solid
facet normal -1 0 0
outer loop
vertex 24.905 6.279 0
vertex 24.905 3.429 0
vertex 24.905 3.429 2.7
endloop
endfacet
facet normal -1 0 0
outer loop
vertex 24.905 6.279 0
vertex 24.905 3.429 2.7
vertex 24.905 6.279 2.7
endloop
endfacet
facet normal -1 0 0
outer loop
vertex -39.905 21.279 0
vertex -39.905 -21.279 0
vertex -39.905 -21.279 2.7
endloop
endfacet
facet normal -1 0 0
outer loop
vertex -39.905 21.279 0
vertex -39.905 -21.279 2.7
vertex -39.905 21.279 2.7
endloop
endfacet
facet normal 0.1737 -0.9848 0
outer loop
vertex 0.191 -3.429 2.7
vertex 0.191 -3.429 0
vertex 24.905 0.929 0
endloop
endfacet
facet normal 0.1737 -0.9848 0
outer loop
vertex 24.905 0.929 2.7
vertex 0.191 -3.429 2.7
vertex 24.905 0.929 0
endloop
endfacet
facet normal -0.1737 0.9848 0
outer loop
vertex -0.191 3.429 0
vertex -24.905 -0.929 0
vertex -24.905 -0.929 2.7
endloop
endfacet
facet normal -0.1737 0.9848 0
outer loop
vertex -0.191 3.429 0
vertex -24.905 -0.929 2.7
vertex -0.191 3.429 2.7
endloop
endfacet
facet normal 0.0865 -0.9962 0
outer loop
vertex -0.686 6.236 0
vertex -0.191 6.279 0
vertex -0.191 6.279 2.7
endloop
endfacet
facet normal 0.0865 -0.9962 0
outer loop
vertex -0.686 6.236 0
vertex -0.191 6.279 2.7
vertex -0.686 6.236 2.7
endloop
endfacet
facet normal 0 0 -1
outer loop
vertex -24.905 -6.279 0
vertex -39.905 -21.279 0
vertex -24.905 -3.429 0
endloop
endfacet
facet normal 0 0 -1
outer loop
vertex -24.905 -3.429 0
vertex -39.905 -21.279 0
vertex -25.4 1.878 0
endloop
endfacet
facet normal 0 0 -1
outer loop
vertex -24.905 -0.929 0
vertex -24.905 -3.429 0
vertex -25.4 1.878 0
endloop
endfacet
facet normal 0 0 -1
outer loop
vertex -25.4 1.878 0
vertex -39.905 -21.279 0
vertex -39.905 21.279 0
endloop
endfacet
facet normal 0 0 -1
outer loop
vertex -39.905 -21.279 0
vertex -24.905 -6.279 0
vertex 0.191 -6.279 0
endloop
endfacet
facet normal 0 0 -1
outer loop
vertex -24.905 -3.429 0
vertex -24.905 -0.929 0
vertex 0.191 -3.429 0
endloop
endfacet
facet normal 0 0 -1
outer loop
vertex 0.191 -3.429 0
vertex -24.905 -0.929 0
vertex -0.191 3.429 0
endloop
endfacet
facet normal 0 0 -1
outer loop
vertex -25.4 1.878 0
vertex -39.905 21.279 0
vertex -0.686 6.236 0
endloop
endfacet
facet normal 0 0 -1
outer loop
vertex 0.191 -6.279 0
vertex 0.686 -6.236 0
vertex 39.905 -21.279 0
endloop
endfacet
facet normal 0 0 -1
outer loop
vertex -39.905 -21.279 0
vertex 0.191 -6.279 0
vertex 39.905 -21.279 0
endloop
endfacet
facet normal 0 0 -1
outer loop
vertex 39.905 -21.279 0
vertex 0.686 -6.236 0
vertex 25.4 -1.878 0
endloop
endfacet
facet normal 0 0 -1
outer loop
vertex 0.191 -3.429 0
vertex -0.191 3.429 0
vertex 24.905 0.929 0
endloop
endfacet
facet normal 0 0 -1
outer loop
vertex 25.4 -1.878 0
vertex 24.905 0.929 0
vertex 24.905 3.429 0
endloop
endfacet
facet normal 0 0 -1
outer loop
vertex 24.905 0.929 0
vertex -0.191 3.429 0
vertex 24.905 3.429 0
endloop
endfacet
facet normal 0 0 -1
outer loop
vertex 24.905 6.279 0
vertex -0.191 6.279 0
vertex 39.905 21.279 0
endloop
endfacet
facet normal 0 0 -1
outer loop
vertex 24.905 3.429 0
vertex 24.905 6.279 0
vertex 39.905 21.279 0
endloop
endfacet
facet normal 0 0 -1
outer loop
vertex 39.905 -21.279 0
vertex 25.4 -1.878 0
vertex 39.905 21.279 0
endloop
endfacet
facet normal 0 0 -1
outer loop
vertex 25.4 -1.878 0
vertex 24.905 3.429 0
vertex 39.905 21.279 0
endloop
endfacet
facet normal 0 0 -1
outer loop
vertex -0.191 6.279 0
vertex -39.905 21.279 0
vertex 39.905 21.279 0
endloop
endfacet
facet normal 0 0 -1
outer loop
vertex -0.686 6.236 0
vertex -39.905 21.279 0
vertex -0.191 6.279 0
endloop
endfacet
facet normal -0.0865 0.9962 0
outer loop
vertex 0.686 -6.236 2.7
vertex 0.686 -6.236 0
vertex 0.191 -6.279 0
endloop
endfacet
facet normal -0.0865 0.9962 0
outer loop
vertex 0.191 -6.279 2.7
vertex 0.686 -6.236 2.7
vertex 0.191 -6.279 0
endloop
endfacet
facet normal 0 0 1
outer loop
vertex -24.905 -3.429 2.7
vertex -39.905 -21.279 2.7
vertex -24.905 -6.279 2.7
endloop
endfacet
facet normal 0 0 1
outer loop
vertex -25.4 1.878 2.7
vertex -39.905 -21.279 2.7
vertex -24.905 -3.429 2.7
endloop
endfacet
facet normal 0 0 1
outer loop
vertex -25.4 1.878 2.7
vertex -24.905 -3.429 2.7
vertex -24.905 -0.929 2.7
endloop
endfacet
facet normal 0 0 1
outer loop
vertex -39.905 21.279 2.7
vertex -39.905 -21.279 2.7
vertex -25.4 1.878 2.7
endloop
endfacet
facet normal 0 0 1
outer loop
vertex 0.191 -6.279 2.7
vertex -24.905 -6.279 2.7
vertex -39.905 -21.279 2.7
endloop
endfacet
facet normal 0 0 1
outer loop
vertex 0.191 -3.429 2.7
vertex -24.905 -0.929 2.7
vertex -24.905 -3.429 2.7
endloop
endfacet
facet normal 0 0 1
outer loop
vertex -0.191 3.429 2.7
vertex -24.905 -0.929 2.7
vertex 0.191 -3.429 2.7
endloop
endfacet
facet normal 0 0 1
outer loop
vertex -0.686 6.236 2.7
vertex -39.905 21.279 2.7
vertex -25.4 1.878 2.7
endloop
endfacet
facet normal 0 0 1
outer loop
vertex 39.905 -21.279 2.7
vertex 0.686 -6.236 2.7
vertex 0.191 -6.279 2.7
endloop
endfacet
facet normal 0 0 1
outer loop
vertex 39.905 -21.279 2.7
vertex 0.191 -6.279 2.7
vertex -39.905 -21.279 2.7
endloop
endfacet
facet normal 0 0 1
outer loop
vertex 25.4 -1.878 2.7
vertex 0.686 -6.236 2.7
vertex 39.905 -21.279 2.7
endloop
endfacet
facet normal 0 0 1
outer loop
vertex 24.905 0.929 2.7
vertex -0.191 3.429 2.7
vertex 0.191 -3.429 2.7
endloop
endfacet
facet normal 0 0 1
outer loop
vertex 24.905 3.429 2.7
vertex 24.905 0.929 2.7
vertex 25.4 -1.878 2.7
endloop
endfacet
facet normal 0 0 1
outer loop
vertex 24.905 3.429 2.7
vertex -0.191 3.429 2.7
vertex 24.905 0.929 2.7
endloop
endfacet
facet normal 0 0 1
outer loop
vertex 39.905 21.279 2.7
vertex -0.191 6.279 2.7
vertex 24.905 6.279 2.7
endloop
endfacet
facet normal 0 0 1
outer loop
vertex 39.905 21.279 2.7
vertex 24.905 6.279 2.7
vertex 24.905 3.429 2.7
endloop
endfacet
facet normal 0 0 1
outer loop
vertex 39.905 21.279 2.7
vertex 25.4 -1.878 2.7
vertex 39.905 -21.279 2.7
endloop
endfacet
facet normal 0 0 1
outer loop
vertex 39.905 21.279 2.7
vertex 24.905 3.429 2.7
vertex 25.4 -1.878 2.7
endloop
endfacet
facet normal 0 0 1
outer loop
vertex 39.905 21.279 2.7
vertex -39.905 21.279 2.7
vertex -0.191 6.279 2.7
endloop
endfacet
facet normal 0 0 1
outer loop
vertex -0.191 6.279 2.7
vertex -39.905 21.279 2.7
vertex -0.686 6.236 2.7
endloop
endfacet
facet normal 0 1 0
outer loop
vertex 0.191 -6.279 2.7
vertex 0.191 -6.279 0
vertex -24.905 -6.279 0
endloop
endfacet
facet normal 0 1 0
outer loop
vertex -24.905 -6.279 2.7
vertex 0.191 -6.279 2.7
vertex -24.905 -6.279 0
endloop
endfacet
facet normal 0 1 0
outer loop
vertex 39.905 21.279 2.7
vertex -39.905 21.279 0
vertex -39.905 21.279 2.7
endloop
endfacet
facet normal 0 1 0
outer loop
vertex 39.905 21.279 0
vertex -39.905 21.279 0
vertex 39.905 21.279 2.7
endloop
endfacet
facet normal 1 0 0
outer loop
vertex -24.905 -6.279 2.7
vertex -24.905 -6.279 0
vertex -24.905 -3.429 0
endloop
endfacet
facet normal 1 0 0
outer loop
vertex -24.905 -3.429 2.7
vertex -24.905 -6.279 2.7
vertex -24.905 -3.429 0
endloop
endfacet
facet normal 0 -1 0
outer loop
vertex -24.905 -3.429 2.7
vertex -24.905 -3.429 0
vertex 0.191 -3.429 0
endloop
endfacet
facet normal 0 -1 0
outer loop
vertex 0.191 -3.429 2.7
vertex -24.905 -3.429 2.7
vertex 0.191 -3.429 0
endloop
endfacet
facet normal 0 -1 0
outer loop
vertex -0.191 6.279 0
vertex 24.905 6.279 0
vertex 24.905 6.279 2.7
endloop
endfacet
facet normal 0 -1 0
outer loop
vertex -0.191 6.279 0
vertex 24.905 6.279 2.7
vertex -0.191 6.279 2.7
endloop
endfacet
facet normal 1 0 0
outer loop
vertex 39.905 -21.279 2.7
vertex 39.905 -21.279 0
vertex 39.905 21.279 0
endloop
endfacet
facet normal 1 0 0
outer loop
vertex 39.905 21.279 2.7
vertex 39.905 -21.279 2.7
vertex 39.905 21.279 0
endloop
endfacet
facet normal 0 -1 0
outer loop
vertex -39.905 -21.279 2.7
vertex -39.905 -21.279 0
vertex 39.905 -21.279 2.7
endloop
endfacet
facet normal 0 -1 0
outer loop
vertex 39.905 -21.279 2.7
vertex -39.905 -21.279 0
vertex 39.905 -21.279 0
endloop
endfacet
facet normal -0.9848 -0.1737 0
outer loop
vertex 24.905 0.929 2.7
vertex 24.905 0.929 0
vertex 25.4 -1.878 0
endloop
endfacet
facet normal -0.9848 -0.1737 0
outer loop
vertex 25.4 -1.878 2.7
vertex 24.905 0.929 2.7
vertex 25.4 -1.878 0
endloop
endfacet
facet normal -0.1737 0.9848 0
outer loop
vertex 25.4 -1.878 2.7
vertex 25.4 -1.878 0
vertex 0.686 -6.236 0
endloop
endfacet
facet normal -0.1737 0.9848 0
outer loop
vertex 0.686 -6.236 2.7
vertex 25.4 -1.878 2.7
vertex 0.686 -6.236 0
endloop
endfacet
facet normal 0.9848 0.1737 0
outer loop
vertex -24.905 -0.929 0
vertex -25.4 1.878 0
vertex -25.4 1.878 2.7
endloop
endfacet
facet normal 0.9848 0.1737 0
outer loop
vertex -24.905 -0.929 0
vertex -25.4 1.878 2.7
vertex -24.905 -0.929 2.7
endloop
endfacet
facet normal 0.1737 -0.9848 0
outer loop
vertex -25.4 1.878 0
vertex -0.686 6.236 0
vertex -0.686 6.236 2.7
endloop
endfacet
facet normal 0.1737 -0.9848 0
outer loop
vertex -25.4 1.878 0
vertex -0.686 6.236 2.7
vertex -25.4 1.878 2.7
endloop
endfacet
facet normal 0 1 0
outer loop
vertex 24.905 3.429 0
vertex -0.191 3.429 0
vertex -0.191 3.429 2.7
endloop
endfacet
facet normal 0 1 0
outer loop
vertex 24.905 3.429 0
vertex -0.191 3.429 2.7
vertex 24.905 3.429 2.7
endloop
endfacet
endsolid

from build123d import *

# Parameters (mm, degrees)
SKETCH1_W           = 79.809734904
SKETCH1_H           = 42.557787138
BOSS_EXTRUDE1_DEPTH = 2.7


with BuildPart() as part:
    # Sketch1 → Boss-Extrude1 (new body)
    with BuildSketch(Plane.XY):
        Rectangle(SKETCH1_W, SKETCH1_H)
        Polygon((-24.904867452, -0.928893569), (-0.190628486, 3.428893569), (24.904867452, 3.428893569), (24.904867452, 6.278893569), (-0.190628486, 6.278893569), (-0.685525793, 6.235595665), (-25.399764759, 1.877808527), align=None, mode=Mode.SUBTRACT)
        Polygon((-24.904867452, -3.428893569), (0.190628486, -3.428893569), (24.904867452, 0.928893569), (25.399764759, -1.877808527), (0.685525793, -6.235595665), (0.190628486, -6.278893569), (-24.904867452, -6.278893569), align=None, mode=Mode.SUBTRACT)
    extrude(amount=BOSS_EXTRUDE1_DEPTH)


solid = part.part
